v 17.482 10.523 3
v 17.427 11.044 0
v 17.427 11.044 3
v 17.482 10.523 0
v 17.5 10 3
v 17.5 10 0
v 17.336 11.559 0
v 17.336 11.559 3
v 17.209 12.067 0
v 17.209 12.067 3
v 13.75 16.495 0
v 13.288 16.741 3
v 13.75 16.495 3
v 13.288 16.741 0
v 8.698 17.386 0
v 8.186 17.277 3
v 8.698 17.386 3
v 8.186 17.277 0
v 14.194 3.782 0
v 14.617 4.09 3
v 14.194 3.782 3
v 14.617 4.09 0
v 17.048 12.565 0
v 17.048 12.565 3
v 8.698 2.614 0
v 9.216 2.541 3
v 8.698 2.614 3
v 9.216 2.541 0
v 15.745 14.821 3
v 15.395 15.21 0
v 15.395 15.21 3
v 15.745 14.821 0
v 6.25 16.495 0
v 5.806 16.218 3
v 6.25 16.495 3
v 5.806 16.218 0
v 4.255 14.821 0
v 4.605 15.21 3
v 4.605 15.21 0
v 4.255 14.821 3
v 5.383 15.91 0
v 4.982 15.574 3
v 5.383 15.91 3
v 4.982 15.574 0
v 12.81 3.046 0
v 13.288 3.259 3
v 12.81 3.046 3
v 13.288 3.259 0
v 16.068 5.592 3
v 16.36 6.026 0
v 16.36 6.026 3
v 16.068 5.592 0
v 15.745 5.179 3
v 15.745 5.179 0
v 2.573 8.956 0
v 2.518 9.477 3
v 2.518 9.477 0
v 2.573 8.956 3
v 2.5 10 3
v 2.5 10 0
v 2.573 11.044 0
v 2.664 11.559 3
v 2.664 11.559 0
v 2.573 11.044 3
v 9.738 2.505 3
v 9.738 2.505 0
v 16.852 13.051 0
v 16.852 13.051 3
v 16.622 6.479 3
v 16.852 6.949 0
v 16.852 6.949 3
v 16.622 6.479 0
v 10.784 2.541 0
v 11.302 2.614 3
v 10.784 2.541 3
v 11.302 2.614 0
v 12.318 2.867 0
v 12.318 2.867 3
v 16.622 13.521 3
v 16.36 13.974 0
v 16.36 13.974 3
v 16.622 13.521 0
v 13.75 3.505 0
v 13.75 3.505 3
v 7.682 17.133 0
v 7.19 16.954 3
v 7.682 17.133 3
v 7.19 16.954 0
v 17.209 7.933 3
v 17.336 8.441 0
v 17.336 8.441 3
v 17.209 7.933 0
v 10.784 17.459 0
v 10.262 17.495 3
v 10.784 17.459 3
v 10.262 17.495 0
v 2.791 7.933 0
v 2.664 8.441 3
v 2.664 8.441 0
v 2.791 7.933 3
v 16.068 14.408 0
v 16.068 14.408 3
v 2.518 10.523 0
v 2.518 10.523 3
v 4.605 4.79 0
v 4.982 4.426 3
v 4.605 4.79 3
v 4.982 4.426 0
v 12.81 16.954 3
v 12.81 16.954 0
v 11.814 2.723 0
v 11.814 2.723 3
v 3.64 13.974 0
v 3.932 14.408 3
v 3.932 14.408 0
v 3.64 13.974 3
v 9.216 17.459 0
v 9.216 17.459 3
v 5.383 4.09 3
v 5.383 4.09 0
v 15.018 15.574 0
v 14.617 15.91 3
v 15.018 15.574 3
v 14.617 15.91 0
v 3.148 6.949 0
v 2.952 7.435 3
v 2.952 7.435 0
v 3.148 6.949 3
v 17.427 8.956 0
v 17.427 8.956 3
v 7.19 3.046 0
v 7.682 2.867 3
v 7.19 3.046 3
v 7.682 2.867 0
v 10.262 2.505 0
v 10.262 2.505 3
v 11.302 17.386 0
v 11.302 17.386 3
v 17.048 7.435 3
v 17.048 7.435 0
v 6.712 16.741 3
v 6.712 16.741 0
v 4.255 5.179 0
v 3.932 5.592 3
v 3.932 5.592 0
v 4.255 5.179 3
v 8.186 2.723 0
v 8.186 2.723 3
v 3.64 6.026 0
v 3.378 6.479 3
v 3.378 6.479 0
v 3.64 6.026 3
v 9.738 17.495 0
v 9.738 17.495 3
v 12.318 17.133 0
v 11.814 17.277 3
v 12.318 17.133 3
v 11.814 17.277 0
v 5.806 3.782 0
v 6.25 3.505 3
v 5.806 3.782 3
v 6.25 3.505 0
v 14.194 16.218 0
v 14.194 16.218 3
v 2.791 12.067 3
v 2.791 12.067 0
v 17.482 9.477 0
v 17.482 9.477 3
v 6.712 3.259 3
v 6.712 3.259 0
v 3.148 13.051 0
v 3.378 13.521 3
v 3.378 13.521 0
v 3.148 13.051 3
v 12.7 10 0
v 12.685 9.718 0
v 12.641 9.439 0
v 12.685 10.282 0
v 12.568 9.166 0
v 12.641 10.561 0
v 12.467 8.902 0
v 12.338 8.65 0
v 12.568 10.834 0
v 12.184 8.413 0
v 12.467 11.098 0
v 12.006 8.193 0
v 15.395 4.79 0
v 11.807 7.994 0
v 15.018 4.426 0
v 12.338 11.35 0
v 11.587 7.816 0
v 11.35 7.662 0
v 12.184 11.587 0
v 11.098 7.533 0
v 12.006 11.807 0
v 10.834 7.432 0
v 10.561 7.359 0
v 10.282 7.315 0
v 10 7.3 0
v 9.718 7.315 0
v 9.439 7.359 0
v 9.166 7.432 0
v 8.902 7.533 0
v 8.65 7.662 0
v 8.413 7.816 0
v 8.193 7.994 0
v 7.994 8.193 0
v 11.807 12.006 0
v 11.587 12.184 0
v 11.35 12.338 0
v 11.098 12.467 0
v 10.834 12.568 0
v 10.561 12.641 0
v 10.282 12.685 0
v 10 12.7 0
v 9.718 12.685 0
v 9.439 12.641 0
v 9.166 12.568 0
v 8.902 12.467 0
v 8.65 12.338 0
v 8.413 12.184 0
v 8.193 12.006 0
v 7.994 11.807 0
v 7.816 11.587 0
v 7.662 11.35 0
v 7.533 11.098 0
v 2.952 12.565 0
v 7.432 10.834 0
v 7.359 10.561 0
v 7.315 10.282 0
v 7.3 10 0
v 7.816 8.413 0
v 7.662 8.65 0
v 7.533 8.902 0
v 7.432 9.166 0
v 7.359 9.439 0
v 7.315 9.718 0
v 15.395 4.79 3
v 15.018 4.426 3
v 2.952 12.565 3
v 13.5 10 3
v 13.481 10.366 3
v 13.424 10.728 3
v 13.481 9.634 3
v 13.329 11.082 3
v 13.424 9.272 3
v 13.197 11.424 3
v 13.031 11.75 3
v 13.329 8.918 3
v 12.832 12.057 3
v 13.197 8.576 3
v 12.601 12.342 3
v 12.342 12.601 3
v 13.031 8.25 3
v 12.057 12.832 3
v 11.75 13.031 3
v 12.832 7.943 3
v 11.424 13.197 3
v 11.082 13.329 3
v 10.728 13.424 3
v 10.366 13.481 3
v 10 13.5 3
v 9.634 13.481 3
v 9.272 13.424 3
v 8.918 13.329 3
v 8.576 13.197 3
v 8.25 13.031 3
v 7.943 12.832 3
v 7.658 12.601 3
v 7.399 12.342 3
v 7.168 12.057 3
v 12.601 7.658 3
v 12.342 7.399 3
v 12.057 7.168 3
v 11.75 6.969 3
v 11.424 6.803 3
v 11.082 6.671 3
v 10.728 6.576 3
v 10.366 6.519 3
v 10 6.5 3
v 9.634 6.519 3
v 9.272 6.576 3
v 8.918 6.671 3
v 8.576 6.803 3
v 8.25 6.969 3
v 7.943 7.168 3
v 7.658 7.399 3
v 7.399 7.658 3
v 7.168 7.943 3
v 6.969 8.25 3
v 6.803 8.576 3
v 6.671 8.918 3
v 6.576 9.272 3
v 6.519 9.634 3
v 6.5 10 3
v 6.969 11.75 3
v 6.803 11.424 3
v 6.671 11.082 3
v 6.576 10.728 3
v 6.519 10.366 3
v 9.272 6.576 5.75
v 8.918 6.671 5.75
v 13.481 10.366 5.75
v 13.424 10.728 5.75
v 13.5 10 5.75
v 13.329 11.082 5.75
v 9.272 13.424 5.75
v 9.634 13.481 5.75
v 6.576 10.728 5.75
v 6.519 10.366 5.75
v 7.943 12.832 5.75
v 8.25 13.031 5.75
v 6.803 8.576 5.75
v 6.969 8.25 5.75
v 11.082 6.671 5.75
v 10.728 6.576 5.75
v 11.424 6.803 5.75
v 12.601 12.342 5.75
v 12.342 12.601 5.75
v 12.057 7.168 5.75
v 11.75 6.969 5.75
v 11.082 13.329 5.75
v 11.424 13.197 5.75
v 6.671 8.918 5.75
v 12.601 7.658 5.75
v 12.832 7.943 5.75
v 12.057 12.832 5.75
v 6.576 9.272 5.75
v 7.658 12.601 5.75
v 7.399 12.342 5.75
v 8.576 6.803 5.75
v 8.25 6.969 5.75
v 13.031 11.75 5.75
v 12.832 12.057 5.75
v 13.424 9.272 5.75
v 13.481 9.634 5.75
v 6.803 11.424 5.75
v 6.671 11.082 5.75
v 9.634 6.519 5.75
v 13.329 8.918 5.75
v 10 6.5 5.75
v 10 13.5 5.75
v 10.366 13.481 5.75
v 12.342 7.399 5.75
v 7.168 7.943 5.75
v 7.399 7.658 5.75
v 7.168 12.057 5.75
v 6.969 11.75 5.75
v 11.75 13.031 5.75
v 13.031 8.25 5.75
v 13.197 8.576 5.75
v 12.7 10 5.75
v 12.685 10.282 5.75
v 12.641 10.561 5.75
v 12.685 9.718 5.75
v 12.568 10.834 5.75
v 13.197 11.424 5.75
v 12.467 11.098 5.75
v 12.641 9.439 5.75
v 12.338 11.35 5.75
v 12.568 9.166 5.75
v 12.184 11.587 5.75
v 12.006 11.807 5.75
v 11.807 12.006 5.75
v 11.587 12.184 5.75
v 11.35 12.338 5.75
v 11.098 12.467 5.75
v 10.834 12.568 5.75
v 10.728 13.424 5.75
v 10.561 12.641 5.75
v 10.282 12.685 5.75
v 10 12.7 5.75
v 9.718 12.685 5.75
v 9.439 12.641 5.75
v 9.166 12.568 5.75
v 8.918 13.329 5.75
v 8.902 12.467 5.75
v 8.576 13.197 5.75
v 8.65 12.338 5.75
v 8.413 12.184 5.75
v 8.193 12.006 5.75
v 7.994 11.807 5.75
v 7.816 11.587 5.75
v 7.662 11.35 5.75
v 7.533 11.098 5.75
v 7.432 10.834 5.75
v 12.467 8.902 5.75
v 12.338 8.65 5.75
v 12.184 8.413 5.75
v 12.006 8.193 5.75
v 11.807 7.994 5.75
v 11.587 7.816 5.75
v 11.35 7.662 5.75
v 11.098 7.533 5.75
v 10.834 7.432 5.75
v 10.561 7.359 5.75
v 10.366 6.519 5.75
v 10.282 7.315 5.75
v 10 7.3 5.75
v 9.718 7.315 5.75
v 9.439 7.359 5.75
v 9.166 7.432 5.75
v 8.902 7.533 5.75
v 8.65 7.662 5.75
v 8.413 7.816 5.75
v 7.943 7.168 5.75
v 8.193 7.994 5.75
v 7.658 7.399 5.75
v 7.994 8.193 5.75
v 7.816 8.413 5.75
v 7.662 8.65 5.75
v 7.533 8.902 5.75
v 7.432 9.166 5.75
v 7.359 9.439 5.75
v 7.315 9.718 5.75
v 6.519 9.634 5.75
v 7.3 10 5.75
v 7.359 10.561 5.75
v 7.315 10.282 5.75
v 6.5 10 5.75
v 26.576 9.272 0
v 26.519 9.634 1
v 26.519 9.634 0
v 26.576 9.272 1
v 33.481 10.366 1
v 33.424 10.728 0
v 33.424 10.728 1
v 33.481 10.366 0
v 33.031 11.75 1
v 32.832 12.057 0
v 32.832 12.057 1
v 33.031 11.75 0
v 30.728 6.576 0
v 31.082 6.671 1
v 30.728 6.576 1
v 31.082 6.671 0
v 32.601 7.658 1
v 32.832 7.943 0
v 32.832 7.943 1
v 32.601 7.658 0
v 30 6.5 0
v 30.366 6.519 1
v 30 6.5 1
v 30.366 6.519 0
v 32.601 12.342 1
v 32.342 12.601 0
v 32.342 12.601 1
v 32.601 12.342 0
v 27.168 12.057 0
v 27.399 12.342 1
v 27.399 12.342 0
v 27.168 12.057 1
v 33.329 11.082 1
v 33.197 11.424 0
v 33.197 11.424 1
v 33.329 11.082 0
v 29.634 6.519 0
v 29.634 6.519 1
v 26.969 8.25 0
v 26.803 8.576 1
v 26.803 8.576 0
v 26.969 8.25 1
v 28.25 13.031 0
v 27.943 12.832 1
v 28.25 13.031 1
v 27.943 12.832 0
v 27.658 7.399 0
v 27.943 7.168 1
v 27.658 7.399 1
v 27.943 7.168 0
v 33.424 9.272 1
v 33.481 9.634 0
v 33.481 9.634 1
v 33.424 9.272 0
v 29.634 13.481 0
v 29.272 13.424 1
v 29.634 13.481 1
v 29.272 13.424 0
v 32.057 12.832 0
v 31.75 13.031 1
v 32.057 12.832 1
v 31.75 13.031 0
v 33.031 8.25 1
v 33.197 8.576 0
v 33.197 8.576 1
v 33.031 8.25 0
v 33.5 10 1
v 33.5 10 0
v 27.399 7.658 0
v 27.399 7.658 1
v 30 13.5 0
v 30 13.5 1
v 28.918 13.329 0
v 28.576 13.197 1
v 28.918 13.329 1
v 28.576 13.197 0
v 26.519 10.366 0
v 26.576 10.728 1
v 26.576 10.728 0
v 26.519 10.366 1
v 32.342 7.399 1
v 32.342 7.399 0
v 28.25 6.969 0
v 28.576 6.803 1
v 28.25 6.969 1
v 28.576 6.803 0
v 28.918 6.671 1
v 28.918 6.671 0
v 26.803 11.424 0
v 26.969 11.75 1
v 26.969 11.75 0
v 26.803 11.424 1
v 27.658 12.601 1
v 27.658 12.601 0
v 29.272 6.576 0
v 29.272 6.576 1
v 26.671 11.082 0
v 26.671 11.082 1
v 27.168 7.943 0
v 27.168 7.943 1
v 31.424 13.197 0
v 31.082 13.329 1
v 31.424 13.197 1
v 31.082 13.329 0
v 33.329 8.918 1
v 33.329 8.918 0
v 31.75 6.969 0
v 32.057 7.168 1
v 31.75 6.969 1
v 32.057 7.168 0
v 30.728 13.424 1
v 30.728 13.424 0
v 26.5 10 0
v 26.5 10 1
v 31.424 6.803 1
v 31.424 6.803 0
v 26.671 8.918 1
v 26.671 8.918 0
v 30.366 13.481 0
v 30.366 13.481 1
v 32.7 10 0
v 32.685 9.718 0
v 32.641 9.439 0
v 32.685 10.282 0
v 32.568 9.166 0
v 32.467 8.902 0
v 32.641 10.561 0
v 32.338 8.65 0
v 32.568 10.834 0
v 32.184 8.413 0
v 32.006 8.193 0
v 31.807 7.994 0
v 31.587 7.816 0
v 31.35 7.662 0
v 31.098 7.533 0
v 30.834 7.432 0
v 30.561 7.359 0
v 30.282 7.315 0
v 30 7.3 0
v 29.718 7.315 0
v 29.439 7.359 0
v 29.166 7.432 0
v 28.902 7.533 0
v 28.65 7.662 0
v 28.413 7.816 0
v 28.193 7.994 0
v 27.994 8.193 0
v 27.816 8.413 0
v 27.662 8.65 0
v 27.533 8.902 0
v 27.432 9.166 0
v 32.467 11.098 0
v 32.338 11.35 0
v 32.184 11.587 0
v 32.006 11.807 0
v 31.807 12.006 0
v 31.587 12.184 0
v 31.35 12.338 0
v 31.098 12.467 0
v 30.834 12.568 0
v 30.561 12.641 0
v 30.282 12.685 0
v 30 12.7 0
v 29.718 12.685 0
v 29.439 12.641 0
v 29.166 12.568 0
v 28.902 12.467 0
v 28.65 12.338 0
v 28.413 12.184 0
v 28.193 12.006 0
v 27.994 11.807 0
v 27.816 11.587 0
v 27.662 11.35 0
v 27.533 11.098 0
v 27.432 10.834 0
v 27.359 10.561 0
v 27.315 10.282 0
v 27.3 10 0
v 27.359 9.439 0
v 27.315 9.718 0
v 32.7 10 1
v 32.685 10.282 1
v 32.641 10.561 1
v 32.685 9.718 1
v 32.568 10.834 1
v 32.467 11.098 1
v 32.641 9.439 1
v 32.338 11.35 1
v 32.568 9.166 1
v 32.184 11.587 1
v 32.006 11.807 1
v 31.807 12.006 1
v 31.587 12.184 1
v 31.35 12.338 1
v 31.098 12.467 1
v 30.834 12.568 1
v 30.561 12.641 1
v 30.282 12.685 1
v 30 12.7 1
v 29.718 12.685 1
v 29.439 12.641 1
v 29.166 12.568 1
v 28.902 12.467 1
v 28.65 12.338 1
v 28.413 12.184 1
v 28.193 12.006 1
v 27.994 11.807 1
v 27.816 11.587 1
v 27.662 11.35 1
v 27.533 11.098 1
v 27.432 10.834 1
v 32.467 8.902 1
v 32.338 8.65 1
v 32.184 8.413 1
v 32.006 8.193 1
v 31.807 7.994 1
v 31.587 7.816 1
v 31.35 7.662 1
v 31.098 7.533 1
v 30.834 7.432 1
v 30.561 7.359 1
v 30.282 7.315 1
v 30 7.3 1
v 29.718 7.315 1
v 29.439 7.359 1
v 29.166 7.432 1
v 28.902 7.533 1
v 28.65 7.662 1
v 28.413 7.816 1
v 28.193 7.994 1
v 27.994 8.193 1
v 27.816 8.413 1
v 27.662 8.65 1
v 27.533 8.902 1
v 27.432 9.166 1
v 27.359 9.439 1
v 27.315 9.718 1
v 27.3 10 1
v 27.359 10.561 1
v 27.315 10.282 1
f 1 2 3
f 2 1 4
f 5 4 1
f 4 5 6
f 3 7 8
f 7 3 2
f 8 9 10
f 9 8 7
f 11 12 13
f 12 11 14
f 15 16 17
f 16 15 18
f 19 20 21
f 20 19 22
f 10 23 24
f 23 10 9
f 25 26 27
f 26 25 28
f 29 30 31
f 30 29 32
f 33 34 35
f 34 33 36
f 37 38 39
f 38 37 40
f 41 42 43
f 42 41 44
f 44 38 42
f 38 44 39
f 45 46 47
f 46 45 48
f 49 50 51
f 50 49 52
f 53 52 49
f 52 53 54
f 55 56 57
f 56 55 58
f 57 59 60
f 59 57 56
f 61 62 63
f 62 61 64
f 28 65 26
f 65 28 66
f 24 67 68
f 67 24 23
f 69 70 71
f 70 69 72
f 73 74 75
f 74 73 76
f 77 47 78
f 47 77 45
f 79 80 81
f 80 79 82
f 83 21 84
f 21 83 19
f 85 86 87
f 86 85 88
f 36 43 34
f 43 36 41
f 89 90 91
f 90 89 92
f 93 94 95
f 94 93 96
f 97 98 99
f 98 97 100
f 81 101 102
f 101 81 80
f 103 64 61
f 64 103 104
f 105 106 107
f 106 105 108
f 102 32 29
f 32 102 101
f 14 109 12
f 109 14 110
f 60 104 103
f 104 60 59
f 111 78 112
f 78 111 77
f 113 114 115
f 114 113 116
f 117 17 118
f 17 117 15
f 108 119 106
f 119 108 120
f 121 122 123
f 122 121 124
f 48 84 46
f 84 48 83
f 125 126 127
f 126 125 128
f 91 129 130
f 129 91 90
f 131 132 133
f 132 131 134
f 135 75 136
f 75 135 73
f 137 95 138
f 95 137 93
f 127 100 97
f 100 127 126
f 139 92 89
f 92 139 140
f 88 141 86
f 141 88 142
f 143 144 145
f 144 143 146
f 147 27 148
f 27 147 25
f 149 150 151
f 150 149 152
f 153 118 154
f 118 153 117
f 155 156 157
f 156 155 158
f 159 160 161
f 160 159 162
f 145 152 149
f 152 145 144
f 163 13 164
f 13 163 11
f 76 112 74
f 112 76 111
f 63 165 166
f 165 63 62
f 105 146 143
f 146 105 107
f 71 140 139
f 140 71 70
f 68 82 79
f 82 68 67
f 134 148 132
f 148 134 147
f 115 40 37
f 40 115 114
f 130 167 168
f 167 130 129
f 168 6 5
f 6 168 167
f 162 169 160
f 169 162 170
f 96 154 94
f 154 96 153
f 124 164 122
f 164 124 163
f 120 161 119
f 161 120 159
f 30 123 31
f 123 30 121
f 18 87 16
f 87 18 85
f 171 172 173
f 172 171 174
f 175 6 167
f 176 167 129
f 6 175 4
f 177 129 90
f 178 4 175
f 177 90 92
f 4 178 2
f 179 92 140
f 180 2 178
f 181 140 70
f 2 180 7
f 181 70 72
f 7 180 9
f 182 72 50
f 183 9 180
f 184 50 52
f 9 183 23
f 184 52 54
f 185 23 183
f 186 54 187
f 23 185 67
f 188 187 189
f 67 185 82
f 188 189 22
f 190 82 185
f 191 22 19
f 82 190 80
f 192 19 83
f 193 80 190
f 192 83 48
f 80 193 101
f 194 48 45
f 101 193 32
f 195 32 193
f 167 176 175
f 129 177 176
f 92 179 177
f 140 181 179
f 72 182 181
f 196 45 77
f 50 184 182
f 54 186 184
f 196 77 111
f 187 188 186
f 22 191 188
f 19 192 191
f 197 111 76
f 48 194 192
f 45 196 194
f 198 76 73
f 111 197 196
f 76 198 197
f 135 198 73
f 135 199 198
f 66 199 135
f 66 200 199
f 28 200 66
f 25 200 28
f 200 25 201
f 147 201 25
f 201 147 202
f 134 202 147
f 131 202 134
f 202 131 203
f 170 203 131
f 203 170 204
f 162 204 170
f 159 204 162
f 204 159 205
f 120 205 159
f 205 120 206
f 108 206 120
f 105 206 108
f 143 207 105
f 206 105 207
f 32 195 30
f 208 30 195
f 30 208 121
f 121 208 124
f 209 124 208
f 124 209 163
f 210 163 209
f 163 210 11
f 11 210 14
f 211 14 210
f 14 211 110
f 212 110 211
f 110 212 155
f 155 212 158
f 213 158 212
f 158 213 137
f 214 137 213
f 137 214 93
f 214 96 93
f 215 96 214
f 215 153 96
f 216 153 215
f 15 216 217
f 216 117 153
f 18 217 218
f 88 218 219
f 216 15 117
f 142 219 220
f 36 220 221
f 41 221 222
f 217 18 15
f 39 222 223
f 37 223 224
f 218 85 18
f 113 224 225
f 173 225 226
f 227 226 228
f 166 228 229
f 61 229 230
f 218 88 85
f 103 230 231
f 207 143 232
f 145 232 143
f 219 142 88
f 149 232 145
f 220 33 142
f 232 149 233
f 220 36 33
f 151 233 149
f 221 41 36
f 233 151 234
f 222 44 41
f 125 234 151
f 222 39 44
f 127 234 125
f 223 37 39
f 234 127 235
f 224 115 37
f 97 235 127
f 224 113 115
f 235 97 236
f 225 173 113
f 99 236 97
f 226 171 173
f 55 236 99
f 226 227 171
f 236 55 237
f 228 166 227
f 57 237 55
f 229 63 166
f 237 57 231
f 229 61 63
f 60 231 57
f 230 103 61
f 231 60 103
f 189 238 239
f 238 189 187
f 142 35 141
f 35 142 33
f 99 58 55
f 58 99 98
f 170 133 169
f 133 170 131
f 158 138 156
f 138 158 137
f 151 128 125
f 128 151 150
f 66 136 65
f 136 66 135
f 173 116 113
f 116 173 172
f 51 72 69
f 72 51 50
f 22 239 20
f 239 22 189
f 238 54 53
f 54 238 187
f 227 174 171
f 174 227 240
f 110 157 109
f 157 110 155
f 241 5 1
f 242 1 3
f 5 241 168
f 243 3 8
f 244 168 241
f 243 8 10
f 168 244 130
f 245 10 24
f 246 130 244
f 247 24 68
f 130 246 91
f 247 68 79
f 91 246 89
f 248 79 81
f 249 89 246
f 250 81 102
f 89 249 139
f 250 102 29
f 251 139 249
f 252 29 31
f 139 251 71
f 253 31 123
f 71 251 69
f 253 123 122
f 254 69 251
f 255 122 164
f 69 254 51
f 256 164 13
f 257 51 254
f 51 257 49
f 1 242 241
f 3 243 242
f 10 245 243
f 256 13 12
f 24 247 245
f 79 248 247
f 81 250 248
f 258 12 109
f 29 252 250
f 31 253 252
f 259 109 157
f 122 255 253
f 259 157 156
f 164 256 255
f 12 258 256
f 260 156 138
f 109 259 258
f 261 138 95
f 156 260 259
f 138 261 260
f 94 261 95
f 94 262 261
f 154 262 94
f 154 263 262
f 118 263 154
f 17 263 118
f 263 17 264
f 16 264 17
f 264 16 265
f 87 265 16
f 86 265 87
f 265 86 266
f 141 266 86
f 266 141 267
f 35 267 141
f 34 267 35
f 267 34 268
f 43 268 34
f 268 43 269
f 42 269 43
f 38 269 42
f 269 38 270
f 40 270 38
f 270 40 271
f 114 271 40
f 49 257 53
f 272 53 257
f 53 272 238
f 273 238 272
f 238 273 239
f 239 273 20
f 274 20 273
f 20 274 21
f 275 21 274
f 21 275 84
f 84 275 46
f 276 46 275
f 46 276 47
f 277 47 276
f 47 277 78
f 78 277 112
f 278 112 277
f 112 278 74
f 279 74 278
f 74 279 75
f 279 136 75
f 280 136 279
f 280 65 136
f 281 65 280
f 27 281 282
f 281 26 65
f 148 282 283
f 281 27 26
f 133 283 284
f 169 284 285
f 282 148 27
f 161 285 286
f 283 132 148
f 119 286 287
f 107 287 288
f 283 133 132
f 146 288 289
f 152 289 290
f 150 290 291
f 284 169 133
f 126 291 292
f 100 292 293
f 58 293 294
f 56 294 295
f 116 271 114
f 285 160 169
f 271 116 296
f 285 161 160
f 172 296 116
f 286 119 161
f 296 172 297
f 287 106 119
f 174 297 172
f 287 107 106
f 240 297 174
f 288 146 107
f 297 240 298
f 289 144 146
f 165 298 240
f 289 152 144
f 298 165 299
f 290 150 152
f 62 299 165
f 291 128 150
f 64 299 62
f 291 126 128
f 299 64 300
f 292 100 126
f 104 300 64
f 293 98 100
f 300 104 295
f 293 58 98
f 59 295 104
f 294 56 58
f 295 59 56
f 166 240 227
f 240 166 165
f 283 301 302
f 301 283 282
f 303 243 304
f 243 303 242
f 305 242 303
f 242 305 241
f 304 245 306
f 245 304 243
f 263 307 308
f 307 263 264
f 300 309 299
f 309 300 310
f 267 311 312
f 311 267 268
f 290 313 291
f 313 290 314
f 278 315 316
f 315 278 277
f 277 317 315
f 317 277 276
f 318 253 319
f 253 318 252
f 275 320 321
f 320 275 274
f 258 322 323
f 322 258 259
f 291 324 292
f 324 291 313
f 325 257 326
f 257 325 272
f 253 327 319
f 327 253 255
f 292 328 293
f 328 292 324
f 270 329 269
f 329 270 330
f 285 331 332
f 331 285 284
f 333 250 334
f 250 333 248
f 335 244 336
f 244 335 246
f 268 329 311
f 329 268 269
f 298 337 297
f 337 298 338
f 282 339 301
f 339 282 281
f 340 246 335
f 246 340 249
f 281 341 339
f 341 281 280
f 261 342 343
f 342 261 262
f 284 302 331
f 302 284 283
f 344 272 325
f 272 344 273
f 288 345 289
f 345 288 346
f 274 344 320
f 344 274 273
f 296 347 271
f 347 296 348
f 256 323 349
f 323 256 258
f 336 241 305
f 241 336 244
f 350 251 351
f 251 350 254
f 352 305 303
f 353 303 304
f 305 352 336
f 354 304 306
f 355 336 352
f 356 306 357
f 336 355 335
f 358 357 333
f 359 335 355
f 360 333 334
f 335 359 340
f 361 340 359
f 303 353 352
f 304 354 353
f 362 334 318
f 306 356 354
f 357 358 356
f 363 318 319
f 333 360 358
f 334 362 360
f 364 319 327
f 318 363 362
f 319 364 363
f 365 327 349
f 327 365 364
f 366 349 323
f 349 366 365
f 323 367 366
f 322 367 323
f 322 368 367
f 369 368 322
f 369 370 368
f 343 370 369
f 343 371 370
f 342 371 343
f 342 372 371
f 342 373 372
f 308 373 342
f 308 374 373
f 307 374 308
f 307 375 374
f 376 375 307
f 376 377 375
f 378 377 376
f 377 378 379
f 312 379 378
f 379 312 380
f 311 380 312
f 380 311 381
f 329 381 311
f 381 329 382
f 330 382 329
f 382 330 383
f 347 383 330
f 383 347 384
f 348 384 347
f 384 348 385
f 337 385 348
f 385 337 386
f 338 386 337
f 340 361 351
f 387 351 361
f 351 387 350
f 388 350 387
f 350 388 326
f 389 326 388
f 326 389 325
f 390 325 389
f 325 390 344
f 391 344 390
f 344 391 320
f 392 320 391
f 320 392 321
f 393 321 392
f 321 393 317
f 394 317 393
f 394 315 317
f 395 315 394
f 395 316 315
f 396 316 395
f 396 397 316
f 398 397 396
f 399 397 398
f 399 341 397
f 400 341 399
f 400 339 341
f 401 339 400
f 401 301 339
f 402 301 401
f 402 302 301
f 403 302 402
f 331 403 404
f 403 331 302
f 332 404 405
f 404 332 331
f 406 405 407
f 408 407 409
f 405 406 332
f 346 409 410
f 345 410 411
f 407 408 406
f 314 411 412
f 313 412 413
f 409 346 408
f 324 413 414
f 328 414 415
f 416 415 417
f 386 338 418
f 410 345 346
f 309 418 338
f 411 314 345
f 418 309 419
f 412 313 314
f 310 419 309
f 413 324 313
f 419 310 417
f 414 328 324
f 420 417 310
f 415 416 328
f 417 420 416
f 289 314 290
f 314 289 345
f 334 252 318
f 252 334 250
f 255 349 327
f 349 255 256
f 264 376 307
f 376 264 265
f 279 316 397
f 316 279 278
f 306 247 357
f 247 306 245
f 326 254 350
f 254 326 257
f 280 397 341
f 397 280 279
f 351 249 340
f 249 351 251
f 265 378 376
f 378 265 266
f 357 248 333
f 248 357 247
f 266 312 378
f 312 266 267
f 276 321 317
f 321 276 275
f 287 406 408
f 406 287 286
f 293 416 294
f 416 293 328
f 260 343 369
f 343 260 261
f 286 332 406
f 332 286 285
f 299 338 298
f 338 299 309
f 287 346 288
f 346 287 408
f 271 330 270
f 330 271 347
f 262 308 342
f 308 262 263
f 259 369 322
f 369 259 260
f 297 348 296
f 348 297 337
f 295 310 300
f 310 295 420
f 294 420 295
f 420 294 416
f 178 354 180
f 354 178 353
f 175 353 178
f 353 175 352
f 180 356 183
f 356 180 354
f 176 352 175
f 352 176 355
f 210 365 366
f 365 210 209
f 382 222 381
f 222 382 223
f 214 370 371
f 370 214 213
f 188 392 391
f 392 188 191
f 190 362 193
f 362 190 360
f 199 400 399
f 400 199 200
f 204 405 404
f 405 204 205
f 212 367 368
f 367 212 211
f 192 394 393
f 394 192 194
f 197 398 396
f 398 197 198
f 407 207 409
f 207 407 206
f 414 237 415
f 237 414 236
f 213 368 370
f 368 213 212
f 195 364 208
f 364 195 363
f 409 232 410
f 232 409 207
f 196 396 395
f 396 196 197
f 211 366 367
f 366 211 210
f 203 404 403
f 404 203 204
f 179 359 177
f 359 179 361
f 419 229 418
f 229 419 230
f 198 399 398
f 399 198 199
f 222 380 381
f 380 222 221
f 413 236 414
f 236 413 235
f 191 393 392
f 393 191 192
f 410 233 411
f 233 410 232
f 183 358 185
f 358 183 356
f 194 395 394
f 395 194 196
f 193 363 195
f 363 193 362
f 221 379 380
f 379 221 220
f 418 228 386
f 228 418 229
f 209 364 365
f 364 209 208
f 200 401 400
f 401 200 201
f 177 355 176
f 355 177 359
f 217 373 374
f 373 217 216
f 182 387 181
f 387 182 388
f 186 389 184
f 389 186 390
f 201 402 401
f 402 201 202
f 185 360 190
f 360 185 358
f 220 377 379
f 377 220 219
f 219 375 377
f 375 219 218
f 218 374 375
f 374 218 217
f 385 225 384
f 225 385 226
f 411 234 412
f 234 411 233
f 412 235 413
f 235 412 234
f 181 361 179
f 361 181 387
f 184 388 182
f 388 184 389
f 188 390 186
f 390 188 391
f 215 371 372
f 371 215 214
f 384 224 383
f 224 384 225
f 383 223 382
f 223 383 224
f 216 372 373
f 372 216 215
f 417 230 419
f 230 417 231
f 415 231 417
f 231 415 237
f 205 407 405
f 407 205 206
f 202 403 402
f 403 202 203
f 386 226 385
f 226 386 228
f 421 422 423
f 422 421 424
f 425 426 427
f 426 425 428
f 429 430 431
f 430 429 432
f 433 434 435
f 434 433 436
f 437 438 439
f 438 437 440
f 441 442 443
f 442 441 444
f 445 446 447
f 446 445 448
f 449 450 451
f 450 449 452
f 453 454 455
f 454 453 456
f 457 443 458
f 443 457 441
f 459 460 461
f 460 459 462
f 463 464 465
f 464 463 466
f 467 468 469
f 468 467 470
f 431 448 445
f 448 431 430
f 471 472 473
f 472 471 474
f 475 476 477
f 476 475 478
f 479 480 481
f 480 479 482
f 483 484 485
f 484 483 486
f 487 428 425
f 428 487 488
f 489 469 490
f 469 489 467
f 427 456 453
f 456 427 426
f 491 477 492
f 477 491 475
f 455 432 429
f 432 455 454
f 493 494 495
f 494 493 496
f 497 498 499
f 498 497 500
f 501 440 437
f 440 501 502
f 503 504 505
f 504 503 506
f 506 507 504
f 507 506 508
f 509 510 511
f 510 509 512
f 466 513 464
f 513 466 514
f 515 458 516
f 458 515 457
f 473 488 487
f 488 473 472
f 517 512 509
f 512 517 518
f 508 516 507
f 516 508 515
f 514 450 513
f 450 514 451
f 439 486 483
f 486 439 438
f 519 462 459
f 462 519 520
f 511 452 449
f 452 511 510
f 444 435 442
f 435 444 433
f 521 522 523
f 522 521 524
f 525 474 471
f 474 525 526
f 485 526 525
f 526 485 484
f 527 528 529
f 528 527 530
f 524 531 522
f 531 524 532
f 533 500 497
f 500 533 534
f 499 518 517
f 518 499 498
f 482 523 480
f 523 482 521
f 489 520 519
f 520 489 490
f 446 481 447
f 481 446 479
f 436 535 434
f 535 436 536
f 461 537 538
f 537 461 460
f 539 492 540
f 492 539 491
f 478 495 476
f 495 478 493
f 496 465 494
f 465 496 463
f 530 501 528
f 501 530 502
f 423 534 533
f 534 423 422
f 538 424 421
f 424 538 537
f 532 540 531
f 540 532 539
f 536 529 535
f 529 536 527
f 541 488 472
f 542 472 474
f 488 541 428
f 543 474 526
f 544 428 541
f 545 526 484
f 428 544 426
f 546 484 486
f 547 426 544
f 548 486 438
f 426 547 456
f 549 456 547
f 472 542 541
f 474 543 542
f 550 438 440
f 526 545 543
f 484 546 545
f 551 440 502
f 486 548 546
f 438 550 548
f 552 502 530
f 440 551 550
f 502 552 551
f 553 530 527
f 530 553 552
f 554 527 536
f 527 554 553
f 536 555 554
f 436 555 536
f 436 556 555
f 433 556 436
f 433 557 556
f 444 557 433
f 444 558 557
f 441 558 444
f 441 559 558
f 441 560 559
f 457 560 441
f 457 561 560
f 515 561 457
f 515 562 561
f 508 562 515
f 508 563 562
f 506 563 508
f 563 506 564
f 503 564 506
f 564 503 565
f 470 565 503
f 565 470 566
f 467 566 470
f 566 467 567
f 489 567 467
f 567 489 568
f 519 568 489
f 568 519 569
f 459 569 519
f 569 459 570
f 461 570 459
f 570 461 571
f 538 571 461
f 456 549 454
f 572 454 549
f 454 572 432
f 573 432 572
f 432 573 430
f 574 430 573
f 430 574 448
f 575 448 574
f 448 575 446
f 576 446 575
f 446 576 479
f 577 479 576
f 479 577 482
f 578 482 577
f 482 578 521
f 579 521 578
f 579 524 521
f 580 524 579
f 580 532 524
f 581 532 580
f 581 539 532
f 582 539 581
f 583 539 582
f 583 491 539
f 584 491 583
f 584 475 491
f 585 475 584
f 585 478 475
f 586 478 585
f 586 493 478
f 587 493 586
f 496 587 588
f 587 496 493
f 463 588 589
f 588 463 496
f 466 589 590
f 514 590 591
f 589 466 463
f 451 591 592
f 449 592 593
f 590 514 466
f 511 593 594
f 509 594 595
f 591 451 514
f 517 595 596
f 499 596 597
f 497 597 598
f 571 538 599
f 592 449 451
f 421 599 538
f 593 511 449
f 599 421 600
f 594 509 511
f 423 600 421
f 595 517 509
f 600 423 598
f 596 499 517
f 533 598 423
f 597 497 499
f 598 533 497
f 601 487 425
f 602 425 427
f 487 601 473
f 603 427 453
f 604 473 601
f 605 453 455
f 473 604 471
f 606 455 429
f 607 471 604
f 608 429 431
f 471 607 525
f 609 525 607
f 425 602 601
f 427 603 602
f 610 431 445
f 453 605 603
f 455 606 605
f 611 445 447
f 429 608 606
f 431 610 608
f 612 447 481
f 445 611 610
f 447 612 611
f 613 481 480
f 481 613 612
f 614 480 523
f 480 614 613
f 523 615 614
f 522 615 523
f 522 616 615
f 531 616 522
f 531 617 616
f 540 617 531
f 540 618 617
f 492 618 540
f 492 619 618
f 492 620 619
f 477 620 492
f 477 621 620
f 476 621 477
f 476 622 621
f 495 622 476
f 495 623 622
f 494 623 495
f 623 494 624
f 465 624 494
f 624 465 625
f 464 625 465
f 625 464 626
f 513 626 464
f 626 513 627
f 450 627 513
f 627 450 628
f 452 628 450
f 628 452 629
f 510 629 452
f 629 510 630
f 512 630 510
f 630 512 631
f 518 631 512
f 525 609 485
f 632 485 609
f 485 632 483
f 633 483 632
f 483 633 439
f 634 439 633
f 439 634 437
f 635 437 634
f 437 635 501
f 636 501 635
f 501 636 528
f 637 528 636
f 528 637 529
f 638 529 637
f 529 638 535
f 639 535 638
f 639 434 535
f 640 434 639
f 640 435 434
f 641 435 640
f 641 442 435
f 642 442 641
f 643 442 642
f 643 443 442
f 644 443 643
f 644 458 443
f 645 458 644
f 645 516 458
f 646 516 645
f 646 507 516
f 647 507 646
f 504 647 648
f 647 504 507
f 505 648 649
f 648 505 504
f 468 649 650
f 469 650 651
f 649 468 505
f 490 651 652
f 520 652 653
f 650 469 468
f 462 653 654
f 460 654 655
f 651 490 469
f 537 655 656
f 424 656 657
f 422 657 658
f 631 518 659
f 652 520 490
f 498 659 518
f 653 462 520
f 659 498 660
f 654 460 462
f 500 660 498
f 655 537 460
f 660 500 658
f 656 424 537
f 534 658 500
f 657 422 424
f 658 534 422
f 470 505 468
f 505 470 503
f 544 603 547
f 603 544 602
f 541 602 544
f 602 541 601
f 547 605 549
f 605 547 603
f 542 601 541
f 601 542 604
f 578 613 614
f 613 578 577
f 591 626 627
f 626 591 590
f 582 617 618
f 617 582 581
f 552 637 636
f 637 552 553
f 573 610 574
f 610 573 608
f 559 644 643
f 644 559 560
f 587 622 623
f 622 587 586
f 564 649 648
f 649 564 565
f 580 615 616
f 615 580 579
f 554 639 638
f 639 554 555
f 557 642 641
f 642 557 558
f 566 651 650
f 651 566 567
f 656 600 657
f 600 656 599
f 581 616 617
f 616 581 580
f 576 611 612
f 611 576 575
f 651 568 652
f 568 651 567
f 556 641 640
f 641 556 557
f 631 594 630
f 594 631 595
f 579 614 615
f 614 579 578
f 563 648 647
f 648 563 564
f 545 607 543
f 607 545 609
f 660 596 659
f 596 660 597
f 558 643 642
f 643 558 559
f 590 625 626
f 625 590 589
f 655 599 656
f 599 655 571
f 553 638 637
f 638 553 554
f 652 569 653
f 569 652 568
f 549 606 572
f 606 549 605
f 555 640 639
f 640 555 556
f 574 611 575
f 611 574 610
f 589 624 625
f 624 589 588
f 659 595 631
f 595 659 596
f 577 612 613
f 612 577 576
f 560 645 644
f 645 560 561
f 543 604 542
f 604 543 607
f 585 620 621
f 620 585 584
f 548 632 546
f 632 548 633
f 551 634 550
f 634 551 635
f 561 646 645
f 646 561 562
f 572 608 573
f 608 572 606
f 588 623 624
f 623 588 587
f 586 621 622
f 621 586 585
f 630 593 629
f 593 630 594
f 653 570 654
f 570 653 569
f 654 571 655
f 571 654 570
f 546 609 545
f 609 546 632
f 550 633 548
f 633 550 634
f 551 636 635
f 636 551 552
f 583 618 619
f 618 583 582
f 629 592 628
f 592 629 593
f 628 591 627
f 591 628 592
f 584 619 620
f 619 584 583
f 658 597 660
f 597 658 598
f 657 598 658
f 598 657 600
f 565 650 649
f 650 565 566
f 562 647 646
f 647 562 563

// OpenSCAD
difference() {
	union() {
		// cube([20, 20, 3]);
		translate([10, 10, 0]) cylinder(r=7.5, h=3, $fn=90);
		translate([10, 10, 0]) cylinder(r=3.5, h=5.75, $fn=60);
	}
	translate([10, 10, -0.1]) cylinder(r=2.5+0.2, h=10, $fn=60);
}

difference() {
	translate([30, 10, 0]) cylinder(r=3.5, h=1, $fn=60);
	translate([30, 10, -0.1]) cylinder(r=2.5+0.2, h=2, $fn=60);
}
